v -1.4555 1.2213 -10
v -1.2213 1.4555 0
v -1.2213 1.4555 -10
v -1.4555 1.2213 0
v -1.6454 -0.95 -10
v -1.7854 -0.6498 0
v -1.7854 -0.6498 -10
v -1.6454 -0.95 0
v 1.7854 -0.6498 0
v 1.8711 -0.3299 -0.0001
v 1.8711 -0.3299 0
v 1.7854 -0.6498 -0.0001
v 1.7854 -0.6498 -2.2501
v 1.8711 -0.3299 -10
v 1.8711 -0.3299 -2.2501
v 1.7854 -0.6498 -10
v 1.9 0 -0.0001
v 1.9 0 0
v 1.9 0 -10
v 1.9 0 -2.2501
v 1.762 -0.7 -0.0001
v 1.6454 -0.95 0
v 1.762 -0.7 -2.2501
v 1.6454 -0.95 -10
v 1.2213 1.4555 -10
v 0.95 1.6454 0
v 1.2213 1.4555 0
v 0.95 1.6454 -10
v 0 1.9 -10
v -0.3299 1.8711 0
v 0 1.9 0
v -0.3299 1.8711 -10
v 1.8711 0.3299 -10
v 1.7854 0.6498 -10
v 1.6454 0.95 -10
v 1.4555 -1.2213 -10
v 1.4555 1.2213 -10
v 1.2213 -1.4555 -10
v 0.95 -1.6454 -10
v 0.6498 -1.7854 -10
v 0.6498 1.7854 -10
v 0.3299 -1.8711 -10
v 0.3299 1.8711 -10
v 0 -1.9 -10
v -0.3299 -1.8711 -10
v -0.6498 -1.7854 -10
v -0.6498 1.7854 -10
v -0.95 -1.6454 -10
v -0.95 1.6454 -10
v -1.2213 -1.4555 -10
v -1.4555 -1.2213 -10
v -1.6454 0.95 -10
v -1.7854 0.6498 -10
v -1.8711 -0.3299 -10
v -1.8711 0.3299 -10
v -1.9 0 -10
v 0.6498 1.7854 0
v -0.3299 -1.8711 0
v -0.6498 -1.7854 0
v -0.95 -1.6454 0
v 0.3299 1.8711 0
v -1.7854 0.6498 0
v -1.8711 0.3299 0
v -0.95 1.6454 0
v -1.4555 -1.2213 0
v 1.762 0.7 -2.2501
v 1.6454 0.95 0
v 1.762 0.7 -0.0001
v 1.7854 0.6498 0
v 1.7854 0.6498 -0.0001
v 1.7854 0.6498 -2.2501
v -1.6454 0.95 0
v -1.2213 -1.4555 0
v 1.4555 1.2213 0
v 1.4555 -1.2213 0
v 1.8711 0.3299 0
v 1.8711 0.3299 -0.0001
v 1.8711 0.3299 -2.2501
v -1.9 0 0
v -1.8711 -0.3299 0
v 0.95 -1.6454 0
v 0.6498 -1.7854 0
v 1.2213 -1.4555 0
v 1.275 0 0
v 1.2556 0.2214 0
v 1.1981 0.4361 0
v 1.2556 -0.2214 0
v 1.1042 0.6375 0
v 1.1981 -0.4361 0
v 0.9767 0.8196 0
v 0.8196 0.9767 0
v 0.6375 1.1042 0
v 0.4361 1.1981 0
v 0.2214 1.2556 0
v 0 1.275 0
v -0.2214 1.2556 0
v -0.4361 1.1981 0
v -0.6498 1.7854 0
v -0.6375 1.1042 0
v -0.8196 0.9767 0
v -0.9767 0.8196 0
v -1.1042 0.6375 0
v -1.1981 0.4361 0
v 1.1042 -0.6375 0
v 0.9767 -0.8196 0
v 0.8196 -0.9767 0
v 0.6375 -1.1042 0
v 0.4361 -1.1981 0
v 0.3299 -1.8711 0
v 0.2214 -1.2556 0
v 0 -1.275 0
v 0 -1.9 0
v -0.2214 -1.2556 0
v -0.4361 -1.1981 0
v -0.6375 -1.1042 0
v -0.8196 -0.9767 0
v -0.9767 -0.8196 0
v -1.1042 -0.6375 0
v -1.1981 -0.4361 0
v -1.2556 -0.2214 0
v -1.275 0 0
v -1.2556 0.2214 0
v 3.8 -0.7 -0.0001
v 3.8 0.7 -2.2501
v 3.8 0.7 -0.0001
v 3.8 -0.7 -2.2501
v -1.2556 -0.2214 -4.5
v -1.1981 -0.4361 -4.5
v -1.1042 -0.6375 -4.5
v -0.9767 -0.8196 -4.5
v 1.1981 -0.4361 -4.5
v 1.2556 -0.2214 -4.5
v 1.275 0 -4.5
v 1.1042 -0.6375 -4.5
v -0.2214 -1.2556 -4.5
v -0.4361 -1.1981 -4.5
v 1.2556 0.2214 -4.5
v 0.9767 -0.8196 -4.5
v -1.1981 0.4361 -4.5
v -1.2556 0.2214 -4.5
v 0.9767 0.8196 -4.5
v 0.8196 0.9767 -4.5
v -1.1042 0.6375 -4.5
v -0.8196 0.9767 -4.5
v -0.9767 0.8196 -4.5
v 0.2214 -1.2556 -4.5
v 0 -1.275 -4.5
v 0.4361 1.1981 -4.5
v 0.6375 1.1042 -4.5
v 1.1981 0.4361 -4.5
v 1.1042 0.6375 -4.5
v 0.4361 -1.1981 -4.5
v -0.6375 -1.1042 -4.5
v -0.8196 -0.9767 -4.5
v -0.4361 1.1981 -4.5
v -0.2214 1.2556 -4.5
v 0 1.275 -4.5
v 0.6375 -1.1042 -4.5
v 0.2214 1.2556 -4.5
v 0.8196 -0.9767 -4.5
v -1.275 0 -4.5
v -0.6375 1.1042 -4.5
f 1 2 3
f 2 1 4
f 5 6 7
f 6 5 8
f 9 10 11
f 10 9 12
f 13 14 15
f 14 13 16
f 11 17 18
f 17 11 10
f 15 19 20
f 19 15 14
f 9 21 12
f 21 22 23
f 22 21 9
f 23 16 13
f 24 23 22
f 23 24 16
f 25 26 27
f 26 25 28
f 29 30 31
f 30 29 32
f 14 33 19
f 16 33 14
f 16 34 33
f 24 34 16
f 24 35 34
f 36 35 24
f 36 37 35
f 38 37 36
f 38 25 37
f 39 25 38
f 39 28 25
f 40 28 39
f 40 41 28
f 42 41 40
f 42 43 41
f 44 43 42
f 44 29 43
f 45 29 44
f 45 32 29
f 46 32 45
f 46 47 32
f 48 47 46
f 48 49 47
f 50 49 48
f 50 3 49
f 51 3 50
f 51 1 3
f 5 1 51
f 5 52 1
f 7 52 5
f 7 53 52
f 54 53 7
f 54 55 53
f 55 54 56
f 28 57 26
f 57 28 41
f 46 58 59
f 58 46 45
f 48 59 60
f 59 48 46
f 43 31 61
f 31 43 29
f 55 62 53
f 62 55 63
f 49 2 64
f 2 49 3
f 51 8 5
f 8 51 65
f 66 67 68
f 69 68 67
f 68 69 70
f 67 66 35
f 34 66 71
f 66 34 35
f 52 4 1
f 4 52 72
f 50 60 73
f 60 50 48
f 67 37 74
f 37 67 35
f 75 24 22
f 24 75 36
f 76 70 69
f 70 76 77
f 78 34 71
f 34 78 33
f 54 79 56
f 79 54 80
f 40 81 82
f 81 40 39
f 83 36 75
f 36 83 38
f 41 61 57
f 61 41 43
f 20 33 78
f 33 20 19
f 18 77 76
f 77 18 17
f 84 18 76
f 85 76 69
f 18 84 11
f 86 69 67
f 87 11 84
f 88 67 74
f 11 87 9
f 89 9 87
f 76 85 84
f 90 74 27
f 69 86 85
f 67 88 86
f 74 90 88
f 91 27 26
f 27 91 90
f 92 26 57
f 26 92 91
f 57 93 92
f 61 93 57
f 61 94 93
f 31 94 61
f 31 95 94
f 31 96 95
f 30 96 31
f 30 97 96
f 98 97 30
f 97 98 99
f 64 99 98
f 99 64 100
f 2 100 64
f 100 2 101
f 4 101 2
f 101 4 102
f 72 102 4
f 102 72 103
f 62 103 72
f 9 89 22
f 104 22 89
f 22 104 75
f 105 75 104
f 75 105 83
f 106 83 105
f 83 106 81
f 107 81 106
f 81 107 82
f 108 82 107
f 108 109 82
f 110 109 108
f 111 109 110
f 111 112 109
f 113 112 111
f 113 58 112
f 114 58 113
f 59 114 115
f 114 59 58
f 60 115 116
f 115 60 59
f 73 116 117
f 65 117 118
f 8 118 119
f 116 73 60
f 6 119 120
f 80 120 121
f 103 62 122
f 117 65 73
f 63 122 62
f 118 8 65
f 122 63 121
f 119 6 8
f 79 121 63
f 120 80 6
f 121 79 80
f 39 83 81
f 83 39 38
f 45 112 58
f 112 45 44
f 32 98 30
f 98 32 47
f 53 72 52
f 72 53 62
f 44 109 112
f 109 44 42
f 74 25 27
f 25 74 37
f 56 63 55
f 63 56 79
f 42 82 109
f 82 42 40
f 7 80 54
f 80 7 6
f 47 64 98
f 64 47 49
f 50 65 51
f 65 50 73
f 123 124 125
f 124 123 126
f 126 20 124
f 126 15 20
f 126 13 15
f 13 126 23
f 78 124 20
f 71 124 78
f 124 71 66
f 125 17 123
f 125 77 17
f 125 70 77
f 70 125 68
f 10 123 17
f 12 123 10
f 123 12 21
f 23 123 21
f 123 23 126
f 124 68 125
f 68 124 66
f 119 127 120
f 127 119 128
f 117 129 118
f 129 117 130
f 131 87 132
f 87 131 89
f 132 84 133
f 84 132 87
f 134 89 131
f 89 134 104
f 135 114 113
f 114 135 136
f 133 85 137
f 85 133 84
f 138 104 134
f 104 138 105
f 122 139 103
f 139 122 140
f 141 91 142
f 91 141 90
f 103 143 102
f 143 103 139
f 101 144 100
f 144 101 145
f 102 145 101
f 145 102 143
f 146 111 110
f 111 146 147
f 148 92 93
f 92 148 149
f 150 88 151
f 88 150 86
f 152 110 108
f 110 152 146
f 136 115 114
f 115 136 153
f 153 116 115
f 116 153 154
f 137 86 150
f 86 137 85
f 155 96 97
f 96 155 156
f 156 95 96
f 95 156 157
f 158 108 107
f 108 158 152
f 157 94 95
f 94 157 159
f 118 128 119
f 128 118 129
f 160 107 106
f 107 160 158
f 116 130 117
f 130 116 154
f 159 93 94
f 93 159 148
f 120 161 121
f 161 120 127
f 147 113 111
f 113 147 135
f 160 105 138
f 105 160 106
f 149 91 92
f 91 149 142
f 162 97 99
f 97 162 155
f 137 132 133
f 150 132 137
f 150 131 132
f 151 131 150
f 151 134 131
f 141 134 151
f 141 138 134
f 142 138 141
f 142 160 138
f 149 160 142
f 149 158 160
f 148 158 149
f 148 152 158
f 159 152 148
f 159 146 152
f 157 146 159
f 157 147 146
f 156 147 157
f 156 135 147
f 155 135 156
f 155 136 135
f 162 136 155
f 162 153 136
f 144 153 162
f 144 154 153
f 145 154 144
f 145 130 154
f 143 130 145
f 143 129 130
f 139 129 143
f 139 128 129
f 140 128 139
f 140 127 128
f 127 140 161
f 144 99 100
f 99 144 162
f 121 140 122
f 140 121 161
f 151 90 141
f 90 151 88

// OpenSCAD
// Measured dimensions
outerDiameter = 3.8;
innerDiameter = 2.55;
flagThickness = 1.4;
flagLength = 1.9;
flagDepth = 2.25;

// Adjustable dimensions
stalkLength = 10;
handleWidth = 0;
flagRotation = 0;

// Calculated dimensions
inchesToMillimeters = 1/25.4;
millimetersToInches = 25.4;
hexagonOutToInRatio = 0.866;
hexagonInToOutRatio = 1 / hexagonOutToInRatio;
wallThickness = (outerDiameter/2 - innerDiameter/2);
echo("wallThickness", wallThickness);

// Visibility variables

$fn = 36;
//$vpr = [55, 0, 25 + 360*$t];
//$vpd = 100;
$vpt = [0,0,-4.5];

color("CornflowerBlue", alpha = 0.0){
    rotate([180,0,0]){
        difference(){
            translate([0,0,0]){
                outerShell();
                translate([0,0,stalkLength]){
                    handle();
                }
            }
            translate([0,0,0]){
                keyShaftHollow();
            }
        }
    }
}

module outerShell(){
    cylinder(stalkLength, d = outerDiameter, center=false);
    rotate([0,0,flagRotation]){
        translate([flagLength/2 + wallThickness/2 + innerDiameter/2,0,flagDepth/2 + 0.0001]){
            cube([flagLength + wallThickness, flagThickness, flagDepth], center=true);
        }
    }
}

module keyShaftHollow(){
    cylinder(flagDepth*4, d = innerDiameter, center=true);
}

module handle(){
    rotate([0,90,0]){
        cylinder(outerDiameter, d = handleWidth, center=true);
    }
}
